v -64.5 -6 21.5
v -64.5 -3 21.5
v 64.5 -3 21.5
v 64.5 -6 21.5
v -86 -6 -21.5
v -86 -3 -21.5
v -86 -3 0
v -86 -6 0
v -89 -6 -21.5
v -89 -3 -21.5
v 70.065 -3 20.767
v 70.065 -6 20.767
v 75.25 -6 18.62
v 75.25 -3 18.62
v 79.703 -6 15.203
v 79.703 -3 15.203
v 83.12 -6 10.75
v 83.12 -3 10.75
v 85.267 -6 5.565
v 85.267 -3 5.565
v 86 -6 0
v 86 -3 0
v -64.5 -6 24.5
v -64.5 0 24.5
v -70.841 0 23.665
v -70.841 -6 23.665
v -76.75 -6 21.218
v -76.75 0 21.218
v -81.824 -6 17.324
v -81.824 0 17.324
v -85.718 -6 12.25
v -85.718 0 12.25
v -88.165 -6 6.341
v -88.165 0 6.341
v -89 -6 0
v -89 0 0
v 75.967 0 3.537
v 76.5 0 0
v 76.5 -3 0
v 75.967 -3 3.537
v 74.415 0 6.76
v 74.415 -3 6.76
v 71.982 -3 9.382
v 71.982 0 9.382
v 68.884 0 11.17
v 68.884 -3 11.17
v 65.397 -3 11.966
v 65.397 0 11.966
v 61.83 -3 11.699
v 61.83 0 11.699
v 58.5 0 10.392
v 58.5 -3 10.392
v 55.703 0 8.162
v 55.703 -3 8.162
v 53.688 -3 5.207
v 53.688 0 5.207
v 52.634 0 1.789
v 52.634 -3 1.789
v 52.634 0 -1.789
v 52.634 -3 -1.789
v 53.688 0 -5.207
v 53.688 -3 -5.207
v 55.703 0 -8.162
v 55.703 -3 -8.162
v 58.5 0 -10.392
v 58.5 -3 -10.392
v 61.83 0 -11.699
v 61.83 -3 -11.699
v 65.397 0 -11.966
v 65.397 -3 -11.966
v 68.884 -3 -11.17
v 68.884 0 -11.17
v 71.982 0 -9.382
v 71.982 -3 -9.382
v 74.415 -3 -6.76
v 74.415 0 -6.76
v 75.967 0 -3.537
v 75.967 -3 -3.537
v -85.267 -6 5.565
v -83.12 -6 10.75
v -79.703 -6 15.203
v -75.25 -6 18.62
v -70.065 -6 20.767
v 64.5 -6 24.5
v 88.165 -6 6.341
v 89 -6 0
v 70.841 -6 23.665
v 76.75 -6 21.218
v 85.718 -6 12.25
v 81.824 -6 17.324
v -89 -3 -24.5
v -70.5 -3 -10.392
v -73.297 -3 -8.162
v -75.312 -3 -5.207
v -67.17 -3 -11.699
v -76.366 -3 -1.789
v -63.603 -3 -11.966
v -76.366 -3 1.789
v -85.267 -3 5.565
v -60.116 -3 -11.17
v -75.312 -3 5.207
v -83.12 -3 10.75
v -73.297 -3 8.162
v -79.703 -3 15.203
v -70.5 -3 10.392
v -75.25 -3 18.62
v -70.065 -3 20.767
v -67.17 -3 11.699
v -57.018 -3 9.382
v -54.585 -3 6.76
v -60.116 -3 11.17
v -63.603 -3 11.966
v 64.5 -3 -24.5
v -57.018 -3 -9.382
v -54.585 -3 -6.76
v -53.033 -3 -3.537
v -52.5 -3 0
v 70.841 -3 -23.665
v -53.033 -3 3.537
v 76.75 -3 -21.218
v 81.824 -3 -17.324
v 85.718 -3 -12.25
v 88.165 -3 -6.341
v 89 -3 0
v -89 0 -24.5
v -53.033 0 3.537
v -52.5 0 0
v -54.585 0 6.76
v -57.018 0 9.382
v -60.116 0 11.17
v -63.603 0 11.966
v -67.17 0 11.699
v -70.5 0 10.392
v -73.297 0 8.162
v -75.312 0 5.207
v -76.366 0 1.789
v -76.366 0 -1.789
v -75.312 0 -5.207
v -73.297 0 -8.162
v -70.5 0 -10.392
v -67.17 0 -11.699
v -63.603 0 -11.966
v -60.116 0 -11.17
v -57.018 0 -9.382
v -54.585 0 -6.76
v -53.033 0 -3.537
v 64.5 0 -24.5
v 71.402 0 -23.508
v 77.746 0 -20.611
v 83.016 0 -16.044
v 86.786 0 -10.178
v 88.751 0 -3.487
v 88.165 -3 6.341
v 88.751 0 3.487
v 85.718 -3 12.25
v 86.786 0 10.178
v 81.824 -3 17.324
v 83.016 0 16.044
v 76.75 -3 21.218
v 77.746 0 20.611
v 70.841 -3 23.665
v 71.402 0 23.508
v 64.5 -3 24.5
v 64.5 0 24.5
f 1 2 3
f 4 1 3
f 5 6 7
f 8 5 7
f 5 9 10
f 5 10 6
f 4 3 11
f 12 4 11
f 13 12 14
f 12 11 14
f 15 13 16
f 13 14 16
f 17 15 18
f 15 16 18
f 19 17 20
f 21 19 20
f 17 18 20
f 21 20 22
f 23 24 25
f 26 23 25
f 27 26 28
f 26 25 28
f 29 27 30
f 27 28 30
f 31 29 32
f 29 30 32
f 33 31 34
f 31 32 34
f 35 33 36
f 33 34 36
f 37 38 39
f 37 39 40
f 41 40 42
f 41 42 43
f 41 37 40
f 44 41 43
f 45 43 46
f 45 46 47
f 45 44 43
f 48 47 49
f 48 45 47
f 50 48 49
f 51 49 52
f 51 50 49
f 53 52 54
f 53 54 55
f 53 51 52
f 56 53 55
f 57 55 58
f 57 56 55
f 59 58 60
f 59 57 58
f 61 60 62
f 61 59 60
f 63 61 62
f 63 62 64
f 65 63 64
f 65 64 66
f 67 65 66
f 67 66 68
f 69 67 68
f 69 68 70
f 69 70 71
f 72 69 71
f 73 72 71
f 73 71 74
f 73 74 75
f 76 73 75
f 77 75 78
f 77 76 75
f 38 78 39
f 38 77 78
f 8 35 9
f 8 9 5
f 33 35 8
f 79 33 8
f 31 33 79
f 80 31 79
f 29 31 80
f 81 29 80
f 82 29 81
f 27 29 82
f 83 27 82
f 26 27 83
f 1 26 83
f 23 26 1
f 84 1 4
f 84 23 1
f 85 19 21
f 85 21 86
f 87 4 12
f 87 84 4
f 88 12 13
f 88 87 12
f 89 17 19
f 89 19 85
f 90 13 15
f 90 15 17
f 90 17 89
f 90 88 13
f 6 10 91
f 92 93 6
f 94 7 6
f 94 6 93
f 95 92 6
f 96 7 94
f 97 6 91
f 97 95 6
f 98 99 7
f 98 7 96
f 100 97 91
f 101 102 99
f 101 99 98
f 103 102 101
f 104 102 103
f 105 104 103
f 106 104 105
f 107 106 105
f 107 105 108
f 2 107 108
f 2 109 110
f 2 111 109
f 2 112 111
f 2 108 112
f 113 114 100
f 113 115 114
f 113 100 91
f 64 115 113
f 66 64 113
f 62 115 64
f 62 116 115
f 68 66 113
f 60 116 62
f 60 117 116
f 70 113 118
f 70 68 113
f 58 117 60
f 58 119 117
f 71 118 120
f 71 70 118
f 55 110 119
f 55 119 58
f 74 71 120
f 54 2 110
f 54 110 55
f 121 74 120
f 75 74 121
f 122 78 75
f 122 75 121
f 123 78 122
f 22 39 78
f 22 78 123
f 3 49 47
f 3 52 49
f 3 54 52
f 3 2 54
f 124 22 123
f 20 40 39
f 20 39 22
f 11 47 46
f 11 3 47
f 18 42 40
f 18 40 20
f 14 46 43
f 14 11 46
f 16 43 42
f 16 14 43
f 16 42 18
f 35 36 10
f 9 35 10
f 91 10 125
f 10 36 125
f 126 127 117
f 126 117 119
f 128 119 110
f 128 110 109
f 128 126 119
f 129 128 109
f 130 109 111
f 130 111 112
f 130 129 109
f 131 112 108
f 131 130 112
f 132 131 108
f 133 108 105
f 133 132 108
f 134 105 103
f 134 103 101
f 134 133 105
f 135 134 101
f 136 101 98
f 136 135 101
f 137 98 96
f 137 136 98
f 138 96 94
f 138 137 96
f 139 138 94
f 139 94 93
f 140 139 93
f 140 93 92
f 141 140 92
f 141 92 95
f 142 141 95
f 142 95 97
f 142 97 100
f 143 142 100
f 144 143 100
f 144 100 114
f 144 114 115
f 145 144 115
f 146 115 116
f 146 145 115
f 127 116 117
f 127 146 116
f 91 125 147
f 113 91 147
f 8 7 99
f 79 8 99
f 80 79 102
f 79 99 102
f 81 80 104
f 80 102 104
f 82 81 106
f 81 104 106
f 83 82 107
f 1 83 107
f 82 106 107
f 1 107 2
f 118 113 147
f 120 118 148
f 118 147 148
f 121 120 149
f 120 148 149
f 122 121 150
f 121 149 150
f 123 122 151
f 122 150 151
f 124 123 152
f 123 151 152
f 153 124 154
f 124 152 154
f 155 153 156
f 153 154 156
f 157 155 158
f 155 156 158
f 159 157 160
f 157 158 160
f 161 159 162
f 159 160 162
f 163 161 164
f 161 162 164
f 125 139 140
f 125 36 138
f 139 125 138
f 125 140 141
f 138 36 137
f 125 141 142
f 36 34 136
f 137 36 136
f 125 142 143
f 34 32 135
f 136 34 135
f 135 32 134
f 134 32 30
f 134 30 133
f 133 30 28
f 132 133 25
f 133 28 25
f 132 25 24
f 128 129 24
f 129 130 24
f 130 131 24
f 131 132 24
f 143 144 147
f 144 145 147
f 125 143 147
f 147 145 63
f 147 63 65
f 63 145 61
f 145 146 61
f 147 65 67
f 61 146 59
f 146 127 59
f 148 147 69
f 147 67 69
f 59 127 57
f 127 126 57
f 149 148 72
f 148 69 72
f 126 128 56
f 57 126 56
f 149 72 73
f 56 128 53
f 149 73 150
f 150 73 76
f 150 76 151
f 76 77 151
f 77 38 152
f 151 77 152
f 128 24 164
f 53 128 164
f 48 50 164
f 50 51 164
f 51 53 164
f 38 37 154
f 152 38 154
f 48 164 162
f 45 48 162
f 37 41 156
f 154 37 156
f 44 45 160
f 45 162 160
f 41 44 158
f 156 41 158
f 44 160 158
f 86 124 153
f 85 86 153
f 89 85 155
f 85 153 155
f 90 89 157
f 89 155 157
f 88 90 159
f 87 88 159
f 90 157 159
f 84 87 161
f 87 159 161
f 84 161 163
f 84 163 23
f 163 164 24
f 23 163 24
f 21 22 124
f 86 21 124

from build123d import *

# Parameters (mm, degrees)
F0_R     = 12
F1_DEPTH = 3
F3_DEPTH = 3
F4_W     = 3
F4_H     = 3
F5_DEPTH = 3


with BuildPart() as f1:
    # F0 (on Front) → F1 (new body)
    with BuildSketch(Plane.XZ):
        with BuildLine():
            ThreePointArc((64.5, -24.5), (89, 0), (64.5, 24.5))
            Line((64.5, 24.5), (-64.5, 24.5))
            ThreePointArc((-64.5, 24.5), (-81.824116, 17.324116), (-89, 0))
            ThreePointArc((-89, 0), (-81.824116, -17.324116), (-64.5, -24.5))
            Line((-64.5, -24.5), (64.5, -24.5))
        make_face()
        with Locations((-64.5, 0)):
            Circle(F0_R, mode=Mode.SUBTRACT)
        with Locations((64.5, 0)):
            Circle(F0_R, mode=Mode.SUBTRACT)
        with BuildLine():
            ThreePointArc((-64.5, -24.5), (-81.824116, -17.324116), (-89, 0))
            Line((-89, 0), (-89, -24.5))
            Line((-89, -24.5), (-64.5, -24.5))
        make_face()
    extrude(amount=F1_DEPTH)

    # F2 (on face) → F3 (join)
    with BuildSketch(Plane.XZ.offset(3)):
        with BuildLine():
            Line((-89, 0), (-89, -24.5))
            Line((-89, -24.5), (-86, -24.5))
            Line((-86, -24.5), (-86, 0))
            ThreePointArc((-86, 0), (-79.702796, 15.202796), (-64.5, 21.5))
            Line((-64.5, 21.5), (64.5, 21.5))
            ThreePointArc((64.5, 21.5), (79.702796, 15.202796), (86, 0))
            Line((86, 0), (89, 0))
            ThreePointArc((89, 0), (81.824116, 17.324116), (64.5, 24.5))
            Line((64.5, 24.5), (-64.5, 24.5))
            ThreePointArc((-64.5, 24.5), (-81.824116, 17.324116), (-89, 0))
        make_face()
    extrude(amount=F3_DEPTH)

    # F4 (on face) → F5 (cut)
    with BuildSketch(Plane.XZ.offset(6)):
        with Locations((-87.5, -23)):
            Rectangle(F4_W, F4_H)
    extrude(amount=-F5_DEPTH, mode=Mode.SUBTRACT)


solid = f1.part
